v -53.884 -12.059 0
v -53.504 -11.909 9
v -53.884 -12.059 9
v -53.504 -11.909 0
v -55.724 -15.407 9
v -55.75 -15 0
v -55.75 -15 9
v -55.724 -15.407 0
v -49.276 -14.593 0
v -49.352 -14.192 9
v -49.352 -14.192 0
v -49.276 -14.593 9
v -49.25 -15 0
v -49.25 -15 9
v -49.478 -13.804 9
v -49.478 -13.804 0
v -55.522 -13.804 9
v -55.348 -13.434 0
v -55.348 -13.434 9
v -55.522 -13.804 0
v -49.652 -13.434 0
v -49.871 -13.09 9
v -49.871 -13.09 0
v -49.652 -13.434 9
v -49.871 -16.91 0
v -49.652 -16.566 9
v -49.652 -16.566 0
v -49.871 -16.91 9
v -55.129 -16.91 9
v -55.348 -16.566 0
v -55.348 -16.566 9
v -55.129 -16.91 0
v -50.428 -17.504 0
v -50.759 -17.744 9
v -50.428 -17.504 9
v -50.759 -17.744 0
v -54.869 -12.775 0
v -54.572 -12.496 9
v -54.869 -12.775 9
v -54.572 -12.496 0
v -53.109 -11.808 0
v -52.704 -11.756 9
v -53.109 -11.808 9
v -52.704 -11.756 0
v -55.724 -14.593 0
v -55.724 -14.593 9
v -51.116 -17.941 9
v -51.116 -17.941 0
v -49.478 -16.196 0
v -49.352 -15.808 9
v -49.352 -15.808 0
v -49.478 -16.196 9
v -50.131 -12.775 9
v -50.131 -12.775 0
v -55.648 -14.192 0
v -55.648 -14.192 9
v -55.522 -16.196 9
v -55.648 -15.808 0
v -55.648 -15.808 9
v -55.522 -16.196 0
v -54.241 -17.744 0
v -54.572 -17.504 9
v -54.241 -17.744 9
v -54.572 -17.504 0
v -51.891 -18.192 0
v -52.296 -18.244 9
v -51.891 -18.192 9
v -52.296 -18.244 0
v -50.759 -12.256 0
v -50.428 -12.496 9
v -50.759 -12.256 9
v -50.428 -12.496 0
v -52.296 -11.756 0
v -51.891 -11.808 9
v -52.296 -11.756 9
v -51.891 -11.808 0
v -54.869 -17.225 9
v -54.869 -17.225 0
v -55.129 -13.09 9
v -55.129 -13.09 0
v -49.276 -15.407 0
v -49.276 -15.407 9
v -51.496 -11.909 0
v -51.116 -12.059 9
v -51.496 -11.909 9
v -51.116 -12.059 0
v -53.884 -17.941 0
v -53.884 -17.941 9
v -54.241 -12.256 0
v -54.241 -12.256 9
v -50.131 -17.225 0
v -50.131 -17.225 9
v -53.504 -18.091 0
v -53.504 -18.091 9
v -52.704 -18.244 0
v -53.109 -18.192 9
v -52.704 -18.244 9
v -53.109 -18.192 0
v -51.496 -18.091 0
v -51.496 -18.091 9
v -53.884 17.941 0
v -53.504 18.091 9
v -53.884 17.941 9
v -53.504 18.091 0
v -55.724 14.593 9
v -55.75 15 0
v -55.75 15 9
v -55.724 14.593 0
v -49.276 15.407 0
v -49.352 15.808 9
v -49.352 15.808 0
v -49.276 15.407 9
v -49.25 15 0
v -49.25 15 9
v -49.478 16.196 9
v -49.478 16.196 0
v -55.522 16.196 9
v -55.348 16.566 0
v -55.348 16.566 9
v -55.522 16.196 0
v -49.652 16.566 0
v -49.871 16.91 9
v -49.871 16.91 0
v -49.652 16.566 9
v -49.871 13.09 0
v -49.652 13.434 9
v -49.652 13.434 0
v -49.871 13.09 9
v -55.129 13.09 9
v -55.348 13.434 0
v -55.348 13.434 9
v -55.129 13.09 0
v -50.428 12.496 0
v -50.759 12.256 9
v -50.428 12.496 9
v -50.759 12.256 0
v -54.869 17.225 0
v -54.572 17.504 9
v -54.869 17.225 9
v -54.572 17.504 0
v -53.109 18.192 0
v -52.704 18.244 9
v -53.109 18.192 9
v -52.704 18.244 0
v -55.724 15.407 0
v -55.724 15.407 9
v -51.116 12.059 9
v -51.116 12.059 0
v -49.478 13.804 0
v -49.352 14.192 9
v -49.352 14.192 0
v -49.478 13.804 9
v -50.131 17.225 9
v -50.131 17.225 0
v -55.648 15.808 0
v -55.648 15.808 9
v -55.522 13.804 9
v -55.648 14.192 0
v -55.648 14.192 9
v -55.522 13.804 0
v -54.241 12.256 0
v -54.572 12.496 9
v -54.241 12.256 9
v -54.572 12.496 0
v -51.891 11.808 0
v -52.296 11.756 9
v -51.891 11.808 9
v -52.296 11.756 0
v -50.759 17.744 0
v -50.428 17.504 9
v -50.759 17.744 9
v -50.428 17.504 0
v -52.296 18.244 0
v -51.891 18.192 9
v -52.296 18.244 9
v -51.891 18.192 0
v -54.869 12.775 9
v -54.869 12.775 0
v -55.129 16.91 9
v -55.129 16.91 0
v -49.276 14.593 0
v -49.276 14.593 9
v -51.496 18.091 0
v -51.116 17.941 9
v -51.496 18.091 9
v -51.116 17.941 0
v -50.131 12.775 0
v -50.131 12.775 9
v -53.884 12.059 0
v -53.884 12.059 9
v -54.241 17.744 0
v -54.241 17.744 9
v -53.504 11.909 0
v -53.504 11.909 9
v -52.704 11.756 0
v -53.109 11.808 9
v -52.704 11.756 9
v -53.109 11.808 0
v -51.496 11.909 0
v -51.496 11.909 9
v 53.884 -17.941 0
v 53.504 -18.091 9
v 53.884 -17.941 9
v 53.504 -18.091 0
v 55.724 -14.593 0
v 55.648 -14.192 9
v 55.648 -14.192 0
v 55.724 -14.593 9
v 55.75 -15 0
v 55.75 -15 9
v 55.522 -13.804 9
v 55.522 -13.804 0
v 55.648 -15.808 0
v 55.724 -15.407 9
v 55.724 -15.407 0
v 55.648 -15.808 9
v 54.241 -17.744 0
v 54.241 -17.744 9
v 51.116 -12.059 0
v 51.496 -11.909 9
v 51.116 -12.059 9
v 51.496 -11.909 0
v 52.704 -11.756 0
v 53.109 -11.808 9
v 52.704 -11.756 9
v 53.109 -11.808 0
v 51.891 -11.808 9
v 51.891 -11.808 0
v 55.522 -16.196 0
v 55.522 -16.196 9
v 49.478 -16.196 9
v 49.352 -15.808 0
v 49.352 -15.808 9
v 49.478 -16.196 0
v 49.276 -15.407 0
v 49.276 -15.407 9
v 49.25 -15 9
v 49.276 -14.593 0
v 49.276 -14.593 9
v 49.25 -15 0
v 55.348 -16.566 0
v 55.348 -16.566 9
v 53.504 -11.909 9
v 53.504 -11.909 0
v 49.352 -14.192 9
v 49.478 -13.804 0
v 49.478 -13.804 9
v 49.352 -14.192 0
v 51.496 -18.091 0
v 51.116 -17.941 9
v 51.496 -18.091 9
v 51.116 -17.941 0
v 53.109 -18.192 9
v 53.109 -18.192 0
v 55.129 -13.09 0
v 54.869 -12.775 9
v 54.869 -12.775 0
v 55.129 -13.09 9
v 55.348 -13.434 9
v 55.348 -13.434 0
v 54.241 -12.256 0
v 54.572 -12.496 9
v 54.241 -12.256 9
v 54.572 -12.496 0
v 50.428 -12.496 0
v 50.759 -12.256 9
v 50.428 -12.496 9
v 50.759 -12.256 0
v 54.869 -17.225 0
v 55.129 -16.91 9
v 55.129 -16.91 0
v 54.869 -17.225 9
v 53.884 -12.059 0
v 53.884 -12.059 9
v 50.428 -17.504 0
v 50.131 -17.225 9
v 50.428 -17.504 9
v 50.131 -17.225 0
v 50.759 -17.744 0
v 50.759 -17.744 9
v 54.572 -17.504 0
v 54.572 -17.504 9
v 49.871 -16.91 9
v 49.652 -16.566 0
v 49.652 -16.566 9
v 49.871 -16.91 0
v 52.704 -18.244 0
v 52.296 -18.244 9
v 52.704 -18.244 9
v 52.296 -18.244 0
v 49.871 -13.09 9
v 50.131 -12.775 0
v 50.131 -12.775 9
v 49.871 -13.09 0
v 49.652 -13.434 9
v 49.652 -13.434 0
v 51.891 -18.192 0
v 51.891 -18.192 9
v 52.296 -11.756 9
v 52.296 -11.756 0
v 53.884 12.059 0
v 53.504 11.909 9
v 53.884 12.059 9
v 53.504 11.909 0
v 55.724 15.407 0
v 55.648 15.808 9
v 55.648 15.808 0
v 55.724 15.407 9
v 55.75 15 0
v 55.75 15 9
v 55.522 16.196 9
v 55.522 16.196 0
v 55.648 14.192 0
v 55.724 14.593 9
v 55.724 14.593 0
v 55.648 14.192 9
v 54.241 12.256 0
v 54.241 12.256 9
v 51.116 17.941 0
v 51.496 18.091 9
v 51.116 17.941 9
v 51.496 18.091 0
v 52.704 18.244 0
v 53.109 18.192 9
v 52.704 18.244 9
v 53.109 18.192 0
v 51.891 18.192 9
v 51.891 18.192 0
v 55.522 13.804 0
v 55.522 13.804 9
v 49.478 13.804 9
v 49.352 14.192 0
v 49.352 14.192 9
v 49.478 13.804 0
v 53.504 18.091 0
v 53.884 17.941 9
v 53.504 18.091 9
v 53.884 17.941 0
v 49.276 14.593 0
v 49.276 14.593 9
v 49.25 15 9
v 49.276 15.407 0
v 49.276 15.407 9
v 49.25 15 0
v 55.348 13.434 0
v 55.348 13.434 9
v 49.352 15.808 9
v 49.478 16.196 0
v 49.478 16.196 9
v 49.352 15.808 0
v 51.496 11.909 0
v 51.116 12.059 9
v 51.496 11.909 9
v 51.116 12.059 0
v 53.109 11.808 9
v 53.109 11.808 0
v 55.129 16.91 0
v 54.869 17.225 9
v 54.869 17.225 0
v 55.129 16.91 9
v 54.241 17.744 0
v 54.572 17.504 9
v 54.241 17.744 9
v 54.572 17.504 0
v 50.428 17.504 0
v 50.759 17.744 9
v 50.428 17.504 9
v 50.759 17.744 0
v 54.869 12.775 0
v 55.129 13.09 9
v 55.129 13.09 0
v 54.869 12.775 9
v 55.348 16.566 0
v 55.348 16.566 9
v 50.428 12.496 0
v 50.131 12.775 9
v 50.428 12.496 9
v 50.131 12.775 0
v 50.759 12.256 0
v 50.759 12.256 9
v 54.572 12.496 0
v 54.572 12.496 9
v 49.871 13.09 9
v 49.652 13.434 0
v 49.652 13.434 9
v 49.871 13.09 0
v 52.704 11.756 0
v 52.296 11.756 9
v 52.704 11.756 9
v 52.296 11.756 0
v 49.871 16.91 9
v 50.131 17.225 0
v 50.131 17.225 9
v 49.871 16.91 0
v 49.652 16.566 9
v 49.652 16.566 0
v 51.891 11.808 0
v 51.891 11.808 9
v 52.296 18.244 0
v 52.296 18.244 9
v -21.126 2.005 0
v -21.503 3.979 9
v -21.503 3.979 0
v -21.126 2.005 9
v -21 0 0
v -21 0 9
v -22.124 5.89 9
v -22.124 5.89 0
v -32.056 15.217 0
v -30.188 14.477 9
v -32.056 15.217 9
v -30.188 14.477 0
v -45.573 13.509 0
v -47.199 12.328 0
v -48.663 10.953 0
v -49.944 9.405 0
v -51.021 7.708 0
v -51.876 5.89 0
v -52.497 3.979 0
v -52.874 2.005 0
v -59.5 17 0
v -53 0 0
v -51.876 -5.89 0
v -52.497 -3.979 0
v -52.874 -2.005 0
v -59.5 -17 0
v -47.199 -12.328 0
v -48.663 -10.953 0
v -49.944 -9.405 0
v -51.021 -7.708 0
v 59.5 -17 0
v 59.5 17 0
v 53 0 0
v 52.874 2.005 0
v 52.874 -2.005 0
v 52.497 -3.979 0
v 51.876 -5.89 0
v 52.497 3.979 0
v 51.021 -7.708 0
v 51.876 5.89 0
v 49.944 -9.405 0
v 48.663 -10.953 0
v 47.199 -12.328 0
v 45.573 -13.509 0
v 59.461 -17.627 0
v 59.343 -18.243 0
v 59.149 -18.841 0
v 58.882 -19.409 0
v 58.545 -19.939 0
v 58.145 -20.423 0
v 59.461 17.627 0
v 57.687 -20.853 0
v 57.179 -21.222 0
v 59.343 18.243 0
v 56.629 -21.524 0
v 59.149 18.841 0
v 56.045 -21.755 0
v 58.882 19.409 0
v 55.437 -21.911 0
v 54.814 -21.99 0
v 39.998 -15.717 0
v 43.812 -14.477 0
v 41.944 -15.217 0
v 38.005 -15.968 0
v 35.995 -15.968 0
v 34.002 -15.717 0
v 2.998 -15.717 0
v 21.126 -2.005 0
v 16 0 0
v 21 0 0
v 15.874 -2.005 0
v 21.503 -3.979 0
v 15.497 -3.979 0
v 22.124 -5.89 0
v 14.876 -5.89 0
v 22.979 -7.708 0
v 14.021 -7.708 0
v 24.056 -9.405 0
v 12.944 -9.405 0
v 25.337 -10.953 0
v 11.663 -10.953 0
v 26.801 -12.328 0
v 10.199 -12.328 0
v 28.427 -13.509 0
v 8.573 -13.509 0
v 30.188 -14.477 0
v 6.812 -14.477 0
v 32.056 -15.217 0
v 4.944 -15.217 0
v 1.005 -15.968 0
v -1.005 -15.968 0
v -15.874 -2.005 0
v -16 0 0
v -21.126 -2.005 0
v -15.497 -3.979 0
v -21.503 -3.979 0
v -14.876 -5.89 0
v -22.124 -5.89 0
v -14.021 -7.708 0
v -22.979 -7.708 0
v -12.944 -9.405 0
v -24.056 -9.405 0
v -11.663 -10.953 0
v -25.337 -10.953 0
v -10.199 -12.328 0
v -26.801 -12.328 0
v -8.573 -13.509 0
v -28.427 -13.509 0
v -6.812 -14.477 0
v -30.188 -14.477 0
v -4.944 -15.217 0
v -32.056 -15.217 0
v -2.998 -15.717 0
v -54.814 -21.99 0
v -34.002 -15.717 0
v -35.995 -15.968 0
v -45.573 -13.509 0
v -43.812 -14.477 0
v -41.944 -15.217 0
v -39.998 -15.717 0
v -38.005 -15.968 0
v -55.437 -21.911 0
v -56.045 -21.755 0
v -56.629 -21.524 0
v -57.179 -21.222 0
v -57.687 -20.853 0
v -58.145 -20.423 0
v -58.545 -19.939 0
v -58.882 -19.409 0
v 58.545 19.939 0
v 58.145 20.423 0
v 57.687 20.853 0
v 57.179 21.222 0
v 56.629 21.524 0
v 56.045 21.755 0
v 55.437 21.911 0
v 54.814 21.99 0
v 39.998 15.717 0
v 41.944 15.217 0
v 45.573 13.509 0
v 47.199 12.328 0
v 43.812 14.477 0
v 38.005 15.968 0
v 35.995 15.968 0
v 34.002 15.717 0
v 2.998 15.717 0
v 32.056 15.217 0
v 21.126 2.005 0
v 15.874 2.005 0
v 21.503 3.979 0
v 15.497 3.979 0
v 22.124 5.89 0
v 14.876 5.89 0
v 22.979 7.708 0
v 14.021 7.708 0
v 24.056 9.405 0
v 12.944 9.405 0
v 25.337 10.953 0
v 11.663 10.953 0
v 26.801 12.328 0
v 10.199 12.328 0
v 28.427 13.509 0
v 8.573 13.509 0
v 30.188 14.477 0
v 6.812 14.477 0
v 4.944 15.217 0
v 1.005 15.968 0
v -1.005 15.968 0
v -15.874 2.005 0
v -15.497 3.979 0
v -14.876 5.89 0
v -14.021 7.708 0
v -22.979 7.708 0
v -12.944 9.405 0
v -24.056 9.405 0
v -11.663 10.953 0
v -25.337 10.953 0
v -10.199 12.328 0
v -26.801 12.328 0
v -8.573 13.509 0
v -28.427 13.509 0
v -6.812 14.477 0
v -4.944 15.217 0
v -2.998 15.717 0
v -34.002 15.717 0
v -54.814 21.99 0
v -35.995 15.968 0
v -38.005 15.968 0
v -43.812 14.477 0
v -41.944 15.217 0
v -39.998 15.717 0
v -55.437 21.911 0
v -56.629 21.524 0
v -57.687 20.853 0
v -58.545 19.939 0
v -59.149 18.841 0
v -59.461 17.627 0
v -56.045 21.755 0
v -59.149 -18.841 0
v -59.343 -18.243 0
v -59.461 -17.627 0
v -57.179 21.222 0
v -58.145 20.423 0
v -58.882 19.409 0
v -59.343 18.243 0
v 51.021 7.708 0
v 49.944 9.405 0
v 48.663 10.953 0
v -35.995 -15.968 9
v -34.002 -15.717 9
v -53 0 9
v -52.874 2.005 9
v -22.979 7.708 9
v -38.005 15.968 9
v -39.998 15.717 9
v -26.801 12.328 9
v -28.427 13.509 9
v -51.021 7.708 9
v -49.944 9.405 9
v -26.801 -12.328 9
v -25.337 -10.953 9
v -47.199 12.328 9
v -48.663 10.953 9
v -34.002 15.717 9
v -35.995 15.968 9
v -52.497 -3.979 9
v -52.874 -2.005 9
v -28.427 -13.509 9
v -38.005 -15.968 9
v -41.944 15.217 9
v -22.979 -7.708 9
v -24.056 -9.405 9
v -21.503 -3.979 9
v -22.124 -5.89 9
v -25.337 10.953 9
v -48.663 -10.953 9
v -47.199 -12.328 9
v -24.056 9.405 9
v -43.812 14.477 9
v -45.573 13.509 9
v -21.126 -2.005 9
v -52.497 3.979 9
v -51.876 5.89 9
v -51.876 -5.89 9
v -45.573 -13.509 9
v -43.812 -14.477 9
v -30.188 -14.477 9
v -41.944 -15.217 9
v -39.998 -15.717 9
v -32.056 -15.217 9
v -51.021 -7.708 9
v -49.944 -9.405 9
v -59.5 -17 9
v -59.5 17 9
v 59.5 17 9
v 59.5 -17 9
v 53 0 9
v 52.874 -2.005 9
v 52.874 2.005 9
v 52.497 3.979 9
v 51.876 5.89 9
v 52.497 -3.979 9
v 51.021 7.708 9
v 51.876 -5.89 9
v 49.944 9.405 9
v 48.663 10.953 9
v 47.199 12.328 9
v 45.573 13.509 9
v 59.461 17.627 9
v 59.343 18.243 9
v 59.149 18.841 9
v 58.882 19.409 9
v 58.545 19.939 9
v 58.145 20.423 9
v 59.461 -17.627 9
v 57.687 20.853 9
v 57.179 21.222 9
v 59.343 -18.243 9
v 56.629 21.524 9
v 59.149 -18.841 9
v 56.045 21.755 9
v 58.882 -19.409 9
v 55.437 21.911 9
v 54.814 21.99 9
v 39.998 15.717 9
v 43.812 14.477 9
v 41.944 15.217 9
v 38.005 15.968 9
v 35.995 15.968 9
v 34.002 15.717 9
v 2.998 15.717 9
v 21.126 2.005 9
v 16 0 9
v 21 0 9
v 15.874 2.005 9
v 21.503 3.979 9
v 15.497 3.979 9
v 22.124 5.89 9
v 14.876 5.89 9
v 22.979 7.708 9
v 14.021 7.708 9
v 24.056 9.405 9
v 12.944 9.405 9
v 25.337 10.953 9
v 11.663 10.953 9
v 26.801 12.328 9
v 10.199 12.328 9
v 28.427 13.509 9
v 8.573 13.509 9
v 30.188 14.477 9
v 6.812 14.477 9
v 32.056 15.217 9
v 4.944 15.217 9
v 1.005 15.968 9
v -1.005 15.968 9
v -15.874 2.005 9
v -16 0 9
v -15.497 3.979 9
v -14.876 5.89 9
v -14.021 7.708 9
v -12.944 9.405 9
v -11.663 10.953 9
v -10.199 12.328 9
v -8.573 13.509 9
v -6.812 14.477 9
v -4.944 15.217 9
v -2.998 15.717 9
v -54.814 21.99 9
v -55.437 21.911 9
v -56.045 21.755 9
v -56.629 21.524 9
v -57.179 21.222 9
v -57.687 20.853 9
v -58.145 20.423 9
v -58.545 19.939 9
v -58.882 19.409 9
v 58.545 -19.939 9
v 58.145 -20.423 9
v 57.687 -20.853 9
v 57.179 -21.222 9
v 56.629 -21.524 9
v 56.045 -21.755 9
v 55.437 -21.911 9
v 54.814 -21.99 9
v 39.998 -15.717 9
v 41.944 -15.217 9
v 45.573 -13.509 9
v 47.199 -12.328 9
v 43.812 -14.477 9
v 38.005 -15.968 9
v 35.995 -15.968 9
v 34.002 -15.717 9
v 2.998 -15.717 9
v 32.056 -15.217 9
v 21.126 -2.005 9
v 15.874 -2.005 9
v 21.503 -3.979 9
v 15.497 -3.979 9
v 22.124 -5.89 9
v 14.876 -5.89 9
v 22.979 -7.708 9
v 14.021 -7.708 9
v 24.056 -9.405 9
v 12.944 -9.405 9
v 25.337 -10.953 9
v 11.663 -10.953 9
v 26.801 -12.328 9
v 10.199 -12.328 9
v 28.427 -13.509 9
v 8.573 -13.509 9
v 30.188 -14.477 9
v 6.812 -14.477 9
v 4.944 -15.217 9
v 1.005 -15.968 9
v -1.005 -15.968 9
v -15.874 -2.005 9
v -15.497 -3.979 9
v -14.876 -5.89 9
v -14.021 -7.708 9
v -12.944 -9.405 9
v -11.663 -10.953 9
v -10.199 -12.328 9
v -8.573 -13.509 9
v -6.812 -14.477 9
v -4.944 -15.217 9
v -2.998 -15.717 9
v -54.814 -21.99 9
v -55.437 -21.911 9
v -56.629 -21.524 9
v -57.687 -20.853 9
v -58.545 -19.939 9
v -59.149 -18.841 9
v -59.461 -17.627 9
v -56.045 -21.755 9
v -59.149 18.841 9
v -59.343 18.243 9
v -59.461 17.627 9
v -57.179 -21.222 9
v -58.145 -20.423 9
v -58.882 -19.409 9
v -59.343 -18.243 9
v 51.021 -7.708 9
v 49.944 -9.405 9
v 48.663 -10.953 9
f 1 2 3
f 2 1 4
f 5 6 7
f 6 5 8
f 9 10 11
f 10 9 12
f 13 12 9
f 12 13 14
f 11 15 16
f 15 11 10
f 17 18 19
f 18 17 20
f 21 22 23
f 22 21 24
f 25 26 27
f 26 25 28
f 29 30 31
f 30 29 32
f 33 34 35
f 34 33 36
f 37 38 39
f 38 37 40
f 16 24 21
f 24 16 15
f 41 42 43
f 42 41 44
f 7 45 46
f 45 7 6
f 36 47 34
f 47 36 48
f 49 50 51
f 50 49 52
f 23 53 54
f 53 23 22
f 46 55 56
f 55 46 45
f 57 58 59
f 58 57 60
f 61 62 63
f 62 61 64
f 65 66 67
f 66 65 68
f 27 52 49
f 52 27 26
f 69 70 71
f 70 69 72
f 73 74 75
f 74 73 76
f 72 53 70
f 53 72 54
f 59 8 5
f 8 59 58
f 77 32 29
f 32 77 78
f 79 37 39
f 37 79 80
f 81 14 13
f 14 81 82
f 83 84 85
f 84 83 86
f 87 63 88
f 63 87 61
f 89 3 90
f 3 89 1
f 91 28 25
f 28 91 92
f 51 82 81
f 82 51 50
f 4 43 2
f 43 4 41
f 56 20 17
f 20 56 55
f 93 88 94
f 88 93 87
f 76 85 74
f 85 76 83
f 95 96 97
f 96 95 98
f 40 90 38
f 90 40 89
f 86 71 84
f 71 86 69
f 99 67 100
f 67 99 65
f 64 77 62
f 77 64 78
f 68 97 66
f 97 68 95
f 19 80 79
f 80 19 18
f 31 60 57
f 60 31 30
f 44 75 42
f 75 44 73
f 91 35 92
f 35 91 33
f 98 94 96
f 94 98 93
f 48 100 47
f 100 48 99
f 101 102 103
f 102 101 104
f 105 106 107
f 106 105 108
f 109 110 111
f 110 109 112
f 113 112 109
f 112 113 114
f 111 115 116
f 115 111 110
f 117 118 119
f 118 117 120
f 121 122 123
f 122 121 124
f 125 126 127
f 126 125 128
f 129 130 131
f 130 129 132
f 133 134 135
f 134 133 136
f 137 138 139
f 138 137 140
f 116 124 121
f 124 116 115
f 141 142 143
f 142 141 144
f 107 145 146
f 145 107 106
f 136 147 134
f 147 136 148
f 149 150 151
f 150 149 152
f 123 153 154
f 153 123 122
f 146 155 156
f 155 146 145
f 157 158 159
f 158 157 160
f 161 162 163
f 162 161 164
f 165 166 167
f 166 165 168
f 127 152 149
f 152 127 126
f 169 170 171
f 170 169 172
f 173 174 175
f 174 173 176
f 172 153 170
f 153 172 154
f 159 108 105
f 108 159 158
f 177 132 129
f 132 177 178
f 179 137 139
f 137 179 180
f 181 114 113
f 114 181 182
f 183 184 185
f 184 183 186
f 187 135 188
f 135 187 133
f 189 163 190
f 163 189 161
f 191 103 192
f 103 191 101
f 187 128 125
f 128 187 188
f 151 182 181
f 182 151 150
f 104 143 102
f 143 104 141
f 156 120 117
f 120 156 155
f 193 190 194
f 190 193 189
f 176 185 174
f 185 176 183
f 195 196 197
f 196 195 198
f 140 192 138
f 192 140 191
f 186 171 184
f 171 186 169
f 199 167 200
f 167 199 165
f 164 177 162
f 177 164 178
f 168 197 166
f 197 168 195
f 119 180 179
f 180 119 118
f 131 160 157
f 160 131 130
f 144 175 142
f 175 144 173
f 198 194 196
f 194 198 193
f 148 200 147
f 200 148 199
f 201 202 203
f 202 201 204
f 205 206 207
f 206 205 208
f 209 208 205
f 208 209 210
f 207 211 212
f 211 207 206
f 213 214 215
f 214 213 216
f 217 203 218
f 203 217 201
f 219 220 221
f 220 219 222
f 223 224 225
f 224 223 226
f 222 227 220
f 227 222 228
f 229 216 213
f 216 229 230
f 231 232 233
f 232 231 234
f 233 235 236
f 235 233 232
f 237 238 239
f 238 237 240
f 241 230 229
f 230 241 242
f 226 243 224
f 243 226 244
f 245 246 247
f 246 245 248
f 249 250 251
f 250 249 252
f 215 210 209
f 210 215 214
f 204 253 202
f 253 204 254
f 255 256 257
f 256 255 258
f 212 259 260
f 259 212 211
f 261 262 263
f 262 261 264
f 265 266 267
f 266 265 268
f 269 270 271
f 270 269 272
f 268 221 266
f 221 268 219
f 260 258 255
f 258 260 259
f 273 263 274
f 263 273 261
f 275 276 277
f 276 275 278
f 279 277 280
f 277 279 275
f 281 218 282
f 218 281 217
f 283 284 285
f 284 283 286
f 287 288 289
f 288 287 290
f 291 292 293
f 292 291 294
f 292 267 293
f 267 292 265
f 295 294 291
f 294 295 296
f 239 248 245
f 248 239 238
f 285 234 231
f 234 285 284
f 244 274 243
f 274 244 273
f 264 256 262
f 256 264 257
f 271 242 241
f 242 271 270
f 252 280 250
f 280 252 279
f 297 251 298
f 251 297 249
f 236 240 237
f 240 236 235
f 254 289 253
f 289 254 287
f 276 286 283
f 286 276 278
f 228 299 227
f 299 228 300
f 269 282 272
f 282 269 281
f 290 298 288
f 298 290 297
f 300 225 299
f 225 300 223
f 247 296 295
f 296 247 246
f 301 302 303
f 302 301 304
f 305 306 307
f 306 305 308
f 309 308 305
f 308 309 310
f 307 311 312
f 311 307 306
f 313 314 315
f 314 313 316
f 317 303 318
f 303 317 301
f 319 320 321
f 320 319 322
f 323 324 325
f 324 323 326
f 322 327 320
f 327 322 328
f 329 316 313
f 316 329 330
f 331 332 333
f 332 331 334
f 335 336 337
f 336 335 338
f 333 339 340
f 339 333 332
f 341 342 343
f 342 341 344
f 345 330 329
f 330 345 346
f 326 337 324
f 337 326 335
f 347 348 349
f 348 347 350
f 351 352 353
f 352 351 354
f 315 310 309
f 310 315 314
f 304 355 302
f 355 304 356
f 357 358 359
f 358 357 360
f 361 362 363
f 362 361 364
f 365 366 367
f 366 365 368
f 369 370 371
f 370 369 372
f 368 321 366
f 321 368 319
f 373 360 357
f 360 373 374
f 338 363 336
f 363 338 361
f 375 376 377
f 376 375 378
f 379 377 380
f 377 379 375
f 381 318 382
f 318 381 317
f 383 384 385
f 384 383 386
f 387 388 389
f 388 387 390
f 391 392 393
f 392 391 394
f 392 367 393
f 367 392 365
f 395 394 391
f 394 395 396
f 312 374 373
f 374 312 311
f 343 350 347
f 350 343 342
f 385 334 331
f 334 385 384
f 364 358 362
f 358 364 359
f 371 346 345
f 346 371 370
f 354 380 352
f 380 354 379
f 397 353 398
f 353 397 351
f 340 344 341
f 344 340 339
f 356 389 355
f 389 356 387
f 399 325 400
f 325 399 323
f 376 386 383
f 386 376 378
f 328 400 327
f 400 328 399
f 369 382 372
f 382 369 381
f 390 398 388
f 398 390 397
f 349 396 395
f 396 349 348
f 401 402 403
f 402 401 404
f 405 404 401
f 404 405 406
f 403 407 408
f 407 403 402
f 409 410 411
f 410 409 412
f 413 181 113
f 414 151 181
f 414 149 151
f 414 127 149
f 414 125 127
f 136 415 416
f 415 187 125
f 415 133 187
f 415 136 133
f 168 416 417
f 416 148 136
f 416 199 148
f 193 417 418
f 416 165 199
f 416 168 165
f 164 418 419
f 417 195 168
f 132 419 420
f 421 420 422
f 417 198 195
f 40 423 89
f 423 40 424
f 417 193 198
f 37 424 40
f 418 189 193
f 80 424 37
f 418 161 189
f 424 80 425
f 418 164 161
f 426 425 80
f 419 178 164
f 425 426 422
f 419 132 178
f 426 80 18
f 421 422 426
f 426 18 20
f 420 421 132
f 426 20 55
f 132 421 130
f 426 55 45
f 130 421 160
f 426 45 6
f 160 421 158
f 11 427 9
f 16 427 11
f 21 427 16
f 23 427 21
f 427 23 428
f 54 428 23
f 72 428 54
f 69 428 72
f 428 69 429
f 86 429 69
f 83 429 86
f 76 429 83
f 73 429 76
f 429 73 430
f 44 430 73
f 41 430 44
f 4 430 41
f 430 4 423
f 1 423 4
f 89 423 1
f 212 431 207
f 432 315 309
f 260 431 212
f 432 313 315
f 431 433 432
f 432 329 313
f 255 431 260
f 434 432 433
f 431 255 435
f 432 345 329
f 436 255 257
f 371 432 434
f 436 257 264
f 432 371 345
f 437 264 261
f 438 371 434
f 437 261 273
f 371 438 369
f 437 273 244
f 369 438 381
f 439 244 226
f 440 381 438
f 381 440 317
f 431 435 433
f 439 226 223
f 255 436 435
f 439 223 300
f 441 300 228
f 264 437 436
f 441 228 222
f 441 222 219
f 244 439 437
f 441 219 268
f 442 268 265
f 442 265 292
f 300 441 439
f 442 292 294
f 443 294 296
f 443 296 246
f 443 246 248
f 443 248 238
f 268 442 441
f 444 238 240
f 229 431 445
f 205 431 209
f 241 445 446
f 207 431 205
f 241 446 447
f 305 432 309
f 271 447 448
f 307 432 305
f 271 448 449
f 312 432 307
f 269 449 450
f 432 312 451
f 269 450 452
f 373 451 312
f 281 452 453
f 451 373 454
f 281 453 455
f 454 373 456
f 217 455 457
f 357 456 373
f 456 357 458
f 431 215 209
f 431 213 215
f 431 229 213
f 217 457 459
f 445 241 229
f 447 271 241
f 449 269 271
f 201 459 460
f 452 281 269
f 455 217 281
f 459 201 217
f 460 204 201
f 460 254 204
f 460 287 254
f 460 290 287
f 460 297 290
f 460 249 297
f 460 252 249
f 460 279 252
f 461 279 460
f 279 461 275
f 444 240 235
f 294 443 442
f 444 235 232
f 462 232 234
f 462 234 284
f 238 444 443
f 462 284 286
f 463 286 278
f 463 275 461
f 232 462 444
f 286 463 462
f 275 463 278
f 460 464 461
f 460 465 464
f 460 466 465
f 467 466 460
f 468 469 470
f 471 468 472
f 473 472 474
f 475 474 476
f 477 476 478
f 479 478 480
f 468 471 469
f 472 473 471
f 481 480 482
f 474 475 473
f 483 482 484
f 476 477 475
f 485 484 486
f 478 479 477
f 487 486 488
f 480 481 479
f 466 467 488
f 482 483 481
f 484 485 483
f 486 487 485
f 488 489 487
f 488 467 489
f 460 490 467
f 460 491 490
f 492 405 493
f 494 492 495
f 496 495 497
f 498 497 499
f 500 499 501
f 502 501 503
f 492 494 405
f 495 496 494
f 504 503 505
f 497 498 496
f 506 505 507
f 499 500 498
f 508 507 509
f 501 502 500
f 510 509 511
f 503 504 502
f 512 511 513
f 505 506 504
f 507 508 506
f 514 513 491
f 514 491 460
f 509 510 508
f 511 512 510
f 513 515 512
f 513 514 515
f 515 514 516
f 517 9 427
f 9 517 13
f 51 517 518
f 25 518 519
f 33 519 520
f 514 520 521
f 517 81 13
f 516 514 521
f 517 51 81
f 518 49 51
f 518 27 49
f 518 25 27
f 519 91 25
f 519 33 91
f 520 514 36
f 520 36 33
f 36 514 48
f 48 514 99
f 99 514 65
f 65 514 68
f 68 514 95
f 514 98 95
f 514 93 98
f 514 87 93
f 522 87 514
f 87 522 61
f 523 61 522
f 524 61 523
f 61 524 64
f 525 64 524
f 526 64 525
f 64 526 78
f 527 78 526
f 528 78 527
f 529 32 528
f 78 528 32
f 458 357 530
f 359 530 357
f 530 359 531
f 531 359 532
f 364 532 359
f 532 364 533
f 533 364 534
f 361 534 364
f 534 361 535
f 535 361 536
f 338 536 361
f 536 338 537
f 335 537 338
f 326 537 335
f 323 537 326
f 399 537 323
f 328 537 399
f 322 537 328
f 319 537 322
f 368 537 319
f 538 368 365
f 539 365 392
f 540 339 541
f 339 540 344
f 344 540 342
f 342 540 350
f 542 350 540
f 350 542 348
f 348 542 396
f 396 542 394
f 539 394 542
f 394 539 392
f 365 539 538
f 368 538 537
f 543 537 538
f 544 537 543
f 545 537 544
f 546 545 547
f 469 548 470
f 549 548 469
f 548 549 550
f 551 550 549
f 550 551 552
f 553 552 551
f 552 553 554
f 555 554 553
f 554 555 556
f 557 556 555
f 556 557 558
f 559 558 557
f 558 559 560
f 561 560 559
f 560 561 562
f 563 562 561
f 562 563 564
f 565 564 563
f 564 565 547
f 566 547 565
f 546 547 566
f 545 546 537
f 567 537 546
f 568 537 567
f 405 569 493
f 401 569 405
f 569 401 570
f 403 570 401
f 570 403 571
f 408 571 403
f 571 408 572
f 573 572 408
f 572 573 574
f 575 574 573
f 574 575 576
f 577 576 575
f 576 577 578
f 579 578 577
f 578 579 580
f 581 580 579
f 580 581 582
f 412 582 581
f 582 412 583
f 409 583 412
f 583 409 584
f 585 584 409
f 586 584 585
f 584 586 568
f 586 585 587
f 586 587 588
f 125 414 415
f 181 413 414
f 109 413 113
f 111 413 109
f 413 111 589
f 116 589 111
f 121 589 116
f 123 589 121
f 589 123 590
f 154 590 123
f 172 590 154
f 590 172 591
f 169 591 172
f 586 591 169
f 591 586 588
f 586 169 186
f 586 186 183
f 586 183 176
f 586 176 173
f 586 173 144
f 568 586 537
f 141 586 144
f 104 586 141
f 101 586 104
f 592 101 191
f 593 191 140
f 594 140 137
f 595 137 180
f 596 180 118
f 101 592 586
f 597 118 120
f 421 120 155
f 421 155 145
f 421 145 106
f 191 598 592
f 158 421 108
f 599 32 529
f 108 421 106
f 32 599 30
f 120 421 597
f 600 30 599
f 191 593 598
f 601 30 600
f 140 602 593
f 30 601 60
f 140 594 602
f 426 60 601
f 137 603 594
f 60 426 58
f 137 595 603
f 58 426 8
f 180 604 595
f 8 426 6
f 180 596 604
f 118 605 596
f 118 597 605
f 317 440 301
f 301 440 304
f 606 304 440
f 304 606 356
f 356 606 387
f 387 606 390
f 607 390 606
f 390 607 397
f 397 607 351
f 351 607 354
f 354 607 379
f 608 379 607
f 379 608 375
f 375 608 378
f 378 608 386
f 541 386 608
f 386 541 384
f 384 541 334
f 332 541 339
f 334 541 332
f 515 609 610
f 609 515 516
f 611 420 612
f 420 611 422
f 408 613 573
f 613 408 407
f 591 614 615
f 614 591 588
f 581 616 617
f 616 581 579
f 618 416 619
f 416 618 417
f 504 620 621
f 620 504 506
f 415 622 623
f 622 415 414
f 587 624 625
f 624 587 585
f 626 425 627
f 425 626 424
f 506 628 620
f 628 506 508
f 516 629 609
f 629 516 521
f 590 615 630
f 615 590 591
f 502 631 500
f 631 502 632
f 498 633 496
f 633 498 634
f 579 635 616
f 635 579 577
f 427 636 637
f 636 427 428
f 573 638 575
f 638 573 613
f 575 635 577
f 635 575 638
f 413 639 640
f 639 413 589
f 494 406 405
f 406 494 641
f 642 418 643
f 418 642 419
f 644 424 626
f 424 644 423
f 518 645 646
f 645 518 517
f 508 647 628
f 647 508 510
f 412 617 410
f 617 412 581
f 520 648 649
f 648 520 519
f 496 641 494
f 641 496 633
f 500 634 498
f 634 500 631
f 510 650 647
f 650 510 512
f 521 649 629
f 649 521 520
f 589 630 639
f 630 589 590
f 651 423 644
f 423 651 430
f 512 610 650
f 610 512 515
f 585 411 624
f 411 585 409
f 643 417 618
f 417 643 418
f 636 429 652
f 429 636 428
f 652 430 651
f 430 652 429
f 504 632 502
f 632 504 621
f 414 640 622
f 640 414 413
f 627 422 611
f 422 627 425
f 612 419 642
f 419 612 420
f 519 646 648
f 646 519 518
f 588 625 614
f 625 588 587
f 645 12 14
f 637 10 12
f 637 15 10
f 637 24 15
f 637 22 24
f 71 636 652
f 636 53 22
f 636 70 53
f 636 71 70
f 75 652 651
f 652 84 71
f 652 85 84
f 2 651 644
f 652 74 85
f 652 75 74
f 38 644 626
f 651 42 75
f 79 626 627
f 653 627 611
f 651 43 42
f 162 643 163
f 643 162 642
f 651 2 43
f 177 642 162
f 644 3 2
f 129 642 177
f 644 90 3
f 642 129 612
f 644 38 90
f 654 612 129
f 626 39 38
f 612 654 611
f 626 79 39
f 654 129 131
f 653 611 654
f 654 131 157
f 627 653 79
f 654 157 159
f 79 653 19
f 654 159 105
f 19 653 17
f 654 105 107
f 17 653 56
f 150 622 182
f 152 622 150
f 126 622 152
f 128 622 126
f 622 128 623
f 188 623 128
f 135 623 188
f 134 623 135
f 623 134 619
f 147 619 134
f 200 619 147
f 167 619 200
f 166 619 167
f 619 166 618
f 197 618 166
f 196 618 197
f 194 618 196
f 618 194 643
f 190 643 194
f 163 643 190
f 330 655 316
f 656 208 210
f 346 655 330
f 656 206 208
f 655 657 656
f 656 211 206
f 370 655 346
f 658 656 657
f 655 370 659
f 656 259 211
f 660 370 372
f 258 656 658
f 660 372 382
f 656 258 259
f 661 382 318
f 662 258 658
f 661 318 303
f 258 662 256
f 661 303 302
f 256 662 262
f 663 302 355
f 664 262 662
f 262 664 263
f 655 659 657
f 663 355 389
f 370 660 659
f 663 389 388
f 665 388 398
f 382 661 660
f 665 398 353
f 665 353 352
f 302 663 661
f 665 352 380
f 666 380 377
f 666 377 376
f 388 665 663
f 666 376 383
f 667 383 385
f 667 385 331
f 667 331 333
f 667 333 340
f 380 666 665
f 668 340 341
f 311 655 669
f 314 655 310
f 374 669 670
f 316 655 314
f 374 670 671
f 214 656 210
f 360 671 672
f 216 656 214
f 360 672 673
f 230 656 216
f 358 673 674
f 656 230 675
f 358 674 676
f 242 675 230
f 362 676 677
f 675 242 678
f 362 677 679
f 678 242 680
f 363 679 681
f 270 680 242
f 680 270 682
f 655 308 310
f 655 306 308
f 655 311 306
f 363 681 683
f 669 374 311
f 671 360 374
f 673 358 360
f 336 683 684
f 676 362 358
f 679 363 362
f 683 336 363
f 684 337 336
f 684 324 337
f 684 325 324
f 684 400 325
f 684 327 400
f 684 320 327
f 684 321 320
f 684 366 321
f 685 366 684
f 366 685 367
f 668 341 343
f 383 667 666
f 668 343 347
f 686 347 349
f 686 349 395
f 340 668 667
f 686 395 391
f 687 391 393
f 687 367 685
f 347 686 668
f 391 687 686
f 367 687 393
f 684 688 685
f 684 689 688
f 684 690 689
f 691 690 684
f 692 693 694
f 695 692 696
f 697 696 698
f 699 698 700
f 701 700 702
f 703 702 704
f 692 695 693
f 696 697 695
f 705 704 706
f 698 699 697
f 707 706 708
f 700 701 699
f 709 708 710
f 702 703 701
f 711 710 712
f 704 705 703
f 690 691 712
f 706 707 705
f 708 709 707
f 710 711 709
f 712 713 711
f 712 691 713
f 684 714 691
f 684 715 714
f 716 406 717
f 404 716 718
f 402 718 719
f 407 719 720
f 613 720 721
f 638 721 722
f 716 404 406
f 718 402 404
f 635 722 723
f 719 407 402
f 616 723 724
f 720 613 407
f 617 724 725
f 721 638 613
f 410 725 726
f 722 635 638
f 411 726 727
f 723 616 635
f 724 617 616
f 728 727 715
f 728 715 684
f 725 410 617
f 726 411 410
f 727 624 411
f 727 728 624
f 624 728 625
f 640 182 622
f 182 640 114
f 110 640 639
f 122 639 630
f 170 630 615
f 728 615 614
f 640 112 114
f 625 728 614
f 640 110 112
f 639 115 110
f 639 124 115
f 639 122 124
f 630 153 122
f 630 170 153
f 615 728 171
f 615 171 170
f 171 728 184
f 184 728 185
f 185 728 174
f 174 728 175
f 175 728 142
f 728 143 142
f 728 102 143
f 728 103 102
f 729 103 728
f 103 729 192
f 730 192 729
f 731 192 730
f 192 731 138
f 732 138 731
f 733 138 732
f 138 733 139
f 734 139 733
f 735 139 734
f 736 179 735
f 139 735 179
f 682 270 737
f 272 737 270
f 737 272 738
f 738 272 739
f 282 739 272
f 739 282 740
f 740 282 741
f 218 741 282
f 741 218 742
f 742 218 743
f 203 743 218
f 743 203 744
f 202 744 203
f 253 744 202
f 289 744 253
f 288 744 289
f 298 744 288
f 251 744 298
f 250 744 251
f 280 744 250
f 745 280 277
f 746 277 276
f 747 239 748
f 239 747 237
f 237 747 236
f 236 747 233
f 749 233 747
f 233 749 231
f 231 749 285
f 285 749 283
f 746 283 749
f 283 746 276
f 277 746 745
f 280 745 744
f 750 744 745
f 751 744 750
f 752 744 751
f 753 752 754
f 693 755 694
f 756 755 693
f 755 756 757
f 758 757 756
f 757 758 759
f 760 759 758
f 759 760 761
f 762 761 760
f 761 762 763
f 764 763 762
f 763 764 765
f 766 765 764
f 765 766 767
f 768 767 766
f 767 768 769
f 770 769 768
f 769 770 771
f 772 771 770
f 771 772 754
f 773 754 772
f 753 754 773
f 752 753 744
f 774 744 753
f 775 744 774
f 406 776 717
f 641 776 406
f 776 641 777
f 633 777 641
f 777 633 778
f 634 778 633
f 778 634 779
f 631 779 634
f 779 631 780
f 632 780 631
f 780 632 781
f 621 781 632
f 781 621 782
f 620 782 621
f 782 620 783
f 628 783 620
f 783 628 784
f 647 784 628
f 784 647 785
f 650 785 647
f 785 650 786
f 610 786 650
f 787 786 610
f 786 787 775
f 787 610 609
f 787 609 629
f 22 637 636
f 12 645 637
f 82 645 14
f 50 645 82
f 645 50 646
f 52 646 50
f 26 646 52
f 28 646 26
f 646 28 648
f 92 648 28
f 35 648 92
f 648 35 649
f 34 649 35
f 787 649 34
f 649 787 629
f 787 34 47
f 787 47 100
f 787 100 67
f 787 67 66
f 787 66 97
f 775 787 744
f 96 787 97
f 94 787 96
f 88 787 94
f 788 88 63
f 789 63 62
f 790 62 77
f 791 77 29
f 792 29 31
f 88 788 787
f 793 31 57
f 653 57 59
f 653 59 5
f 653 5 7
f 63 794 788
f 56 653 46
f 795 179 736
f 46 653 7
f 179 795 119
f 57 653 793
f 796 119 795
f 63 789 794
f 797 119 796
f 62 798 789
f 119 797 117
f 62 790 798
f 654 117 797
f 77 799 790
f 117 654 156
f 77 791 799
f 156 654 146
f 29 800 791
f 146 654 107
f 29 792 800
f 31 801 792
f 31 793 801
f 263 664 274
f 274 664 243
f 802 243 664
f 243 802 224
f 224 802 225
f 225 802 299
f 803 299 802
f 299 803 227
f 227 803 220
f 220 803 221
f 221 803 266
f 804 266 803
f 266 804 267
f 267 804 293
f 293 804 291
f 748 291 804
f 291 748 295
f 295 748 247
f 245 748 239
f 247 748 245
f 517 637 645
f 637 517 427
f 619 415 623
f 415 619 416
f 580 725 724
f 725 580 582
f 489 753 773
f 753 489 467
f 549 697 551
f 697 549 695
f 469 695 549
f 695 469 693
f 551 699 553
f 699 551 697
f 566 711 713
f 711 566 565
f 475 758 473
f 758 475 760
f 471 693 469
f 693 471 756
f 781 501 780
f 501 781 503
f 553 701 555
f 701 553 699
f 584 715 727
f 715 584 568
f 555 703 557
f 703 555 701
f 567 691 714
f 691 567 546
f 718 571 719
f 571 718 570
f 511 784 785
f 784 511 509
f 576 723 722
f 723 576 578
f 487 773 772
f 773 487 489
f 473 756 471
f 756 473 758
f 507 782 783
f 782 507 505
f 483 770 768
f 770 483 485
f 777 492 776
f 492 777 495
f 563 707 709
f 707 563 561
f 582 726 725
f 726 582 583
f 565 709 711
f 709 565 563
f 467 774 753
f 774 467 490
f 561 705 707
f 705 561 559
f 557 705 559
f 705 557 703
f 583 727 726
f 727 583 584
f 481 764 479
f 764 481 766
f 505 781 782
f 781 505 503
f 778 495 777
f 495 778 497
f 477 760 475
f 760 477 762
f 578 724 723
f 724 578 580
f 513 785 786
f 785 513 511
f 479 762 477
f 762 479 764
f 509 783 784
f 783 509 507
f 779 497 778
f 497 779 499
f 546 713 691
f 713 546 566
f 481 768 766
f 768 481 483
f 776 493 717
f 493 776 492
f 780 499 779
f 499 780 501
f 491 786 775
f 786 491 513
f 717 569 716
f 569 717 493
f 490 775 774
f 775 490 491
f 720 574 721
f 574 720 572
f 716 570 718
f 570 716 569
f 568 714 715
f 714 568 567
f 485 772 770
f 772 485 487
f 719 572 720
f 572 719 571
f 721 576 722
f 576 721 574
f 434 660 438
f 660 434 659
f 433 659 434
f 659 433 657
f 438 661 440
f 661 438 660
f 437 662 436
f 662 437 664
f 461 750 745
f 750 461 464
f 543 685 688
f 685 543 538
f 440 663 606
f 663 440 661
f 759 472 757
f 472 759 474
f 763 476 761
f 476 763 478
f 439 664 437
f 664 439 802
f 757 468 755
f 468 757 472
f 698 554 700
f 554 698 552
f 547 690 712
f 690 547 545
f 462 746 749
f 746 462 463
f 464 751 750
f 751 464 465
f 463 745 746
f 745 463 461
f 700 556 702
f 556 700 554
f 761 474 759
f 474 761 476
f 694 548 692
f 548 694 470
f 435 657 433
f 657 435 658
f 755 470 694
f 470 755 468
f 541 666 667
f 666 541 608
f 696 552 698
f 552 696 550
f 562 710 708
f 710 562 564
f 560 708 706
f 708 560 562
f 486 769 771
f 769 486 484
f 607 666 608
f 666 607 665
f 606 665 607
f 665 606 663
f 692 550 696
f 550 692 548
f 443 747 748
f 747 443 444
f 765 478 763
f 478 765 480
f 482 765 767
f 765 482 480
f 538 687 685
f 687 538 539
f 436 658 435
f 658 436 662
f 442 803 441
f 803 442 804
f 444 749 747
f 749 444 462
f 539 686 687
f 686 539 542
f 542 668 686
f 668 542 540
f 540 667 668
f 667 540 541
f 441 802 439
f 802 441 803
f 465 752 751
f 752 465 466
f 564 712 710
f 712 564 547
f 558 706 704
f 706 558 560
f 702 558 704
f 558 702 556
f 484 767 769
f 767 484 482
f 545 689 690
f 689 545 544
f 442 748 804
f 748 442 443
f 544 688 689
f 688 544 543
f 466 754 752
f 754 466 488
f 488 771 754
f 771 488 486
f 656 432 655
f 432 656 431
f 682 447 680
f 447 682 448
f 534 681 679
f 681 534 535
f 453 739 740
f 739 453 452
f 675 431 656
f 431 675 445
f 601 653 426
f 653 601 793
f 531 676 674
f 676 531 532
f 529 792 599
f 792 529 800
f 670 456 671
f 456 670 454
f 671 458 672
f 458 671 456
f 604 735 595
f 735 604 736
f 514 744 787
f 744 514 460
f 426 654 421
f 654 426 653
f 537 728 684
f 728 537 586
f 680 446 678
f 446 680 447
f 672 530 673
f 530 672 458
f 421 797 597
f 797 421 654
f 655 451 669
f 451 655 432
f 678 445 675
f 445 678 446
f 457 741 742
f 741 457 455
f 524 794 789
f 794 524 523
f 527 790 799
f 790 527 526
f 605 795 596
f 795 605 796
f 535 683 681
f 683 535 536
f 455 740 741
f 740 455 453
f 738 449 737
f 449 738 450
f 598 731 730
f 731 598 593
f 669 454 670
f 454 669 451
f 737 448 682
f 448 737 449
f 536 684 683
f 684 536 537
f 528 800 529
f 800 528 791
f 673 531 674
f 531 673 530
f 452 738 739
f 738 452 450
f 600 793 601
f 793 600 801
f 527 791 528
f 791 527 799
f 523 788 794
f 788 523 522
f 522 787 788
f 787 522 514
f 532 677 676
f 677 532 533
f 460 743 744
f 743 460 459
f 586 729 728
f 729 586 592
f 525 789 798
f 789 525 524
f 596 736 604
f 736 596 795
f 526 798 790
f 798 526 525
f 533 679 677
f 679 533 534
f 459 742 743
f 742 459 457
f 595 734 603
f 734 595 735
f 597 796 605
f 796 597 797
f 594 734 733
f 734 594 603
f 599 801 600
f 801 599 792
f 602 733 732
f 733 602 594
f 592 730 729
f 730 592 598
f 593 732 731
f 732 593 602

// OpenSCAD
$fn = 50;


difference() {
	union() {
		hull() {
			translate(v = [-54.5000000000, 17.0000000000, 0]) {
				cylinder(h = 9, r = 5);
			}
			translate(v = [54.5000000000, 17.0000000000, 0]) {
				cylinder(h = 9, r = 5);
			}
			translate(v = [-54.5000000000, -17.0000000000, 0]) {
				cylinder(h = 9, r = 5);
			}
			translate(v = [54.5000000000, -17.0000000000, 0]) {
				cylinder(h = 9, r = 5);
			}
		}
	}
	union() {
		#translate(v = [-52.5000000000, -15.0000000000, -100.0000000000]) {
			cylinder(h = 200, r = 3.2500000000);
		}
		#translate(v = [-52.5000000000, 15.0000000000, -100.0000000000]) {
			cylinder(h = 200, r = 3.2500000000);
		}
		#translate(v = [52.5000000000, -15.0000000000, -100.0000000000]) {
			cylinder(h = 200, r = 3.2500000000);
		}
		#translate(v = [52.5000000000, 15.0000000000, -100.0000000000]) {
			cylinder(h = 200, r = 3.2500000000);
		}
		#translate(v = [-37.0000000000, 0, 0]) {
			cylinder(h = 9, r = 16.0000000000);
		}
		#cylinder(h = 9, r = 16.0000000000);
		#translate(v = [37.0000000000, 0, 0]) {
			cylinder(h = 9, r = 16.0000000000);
		}
	}
}
